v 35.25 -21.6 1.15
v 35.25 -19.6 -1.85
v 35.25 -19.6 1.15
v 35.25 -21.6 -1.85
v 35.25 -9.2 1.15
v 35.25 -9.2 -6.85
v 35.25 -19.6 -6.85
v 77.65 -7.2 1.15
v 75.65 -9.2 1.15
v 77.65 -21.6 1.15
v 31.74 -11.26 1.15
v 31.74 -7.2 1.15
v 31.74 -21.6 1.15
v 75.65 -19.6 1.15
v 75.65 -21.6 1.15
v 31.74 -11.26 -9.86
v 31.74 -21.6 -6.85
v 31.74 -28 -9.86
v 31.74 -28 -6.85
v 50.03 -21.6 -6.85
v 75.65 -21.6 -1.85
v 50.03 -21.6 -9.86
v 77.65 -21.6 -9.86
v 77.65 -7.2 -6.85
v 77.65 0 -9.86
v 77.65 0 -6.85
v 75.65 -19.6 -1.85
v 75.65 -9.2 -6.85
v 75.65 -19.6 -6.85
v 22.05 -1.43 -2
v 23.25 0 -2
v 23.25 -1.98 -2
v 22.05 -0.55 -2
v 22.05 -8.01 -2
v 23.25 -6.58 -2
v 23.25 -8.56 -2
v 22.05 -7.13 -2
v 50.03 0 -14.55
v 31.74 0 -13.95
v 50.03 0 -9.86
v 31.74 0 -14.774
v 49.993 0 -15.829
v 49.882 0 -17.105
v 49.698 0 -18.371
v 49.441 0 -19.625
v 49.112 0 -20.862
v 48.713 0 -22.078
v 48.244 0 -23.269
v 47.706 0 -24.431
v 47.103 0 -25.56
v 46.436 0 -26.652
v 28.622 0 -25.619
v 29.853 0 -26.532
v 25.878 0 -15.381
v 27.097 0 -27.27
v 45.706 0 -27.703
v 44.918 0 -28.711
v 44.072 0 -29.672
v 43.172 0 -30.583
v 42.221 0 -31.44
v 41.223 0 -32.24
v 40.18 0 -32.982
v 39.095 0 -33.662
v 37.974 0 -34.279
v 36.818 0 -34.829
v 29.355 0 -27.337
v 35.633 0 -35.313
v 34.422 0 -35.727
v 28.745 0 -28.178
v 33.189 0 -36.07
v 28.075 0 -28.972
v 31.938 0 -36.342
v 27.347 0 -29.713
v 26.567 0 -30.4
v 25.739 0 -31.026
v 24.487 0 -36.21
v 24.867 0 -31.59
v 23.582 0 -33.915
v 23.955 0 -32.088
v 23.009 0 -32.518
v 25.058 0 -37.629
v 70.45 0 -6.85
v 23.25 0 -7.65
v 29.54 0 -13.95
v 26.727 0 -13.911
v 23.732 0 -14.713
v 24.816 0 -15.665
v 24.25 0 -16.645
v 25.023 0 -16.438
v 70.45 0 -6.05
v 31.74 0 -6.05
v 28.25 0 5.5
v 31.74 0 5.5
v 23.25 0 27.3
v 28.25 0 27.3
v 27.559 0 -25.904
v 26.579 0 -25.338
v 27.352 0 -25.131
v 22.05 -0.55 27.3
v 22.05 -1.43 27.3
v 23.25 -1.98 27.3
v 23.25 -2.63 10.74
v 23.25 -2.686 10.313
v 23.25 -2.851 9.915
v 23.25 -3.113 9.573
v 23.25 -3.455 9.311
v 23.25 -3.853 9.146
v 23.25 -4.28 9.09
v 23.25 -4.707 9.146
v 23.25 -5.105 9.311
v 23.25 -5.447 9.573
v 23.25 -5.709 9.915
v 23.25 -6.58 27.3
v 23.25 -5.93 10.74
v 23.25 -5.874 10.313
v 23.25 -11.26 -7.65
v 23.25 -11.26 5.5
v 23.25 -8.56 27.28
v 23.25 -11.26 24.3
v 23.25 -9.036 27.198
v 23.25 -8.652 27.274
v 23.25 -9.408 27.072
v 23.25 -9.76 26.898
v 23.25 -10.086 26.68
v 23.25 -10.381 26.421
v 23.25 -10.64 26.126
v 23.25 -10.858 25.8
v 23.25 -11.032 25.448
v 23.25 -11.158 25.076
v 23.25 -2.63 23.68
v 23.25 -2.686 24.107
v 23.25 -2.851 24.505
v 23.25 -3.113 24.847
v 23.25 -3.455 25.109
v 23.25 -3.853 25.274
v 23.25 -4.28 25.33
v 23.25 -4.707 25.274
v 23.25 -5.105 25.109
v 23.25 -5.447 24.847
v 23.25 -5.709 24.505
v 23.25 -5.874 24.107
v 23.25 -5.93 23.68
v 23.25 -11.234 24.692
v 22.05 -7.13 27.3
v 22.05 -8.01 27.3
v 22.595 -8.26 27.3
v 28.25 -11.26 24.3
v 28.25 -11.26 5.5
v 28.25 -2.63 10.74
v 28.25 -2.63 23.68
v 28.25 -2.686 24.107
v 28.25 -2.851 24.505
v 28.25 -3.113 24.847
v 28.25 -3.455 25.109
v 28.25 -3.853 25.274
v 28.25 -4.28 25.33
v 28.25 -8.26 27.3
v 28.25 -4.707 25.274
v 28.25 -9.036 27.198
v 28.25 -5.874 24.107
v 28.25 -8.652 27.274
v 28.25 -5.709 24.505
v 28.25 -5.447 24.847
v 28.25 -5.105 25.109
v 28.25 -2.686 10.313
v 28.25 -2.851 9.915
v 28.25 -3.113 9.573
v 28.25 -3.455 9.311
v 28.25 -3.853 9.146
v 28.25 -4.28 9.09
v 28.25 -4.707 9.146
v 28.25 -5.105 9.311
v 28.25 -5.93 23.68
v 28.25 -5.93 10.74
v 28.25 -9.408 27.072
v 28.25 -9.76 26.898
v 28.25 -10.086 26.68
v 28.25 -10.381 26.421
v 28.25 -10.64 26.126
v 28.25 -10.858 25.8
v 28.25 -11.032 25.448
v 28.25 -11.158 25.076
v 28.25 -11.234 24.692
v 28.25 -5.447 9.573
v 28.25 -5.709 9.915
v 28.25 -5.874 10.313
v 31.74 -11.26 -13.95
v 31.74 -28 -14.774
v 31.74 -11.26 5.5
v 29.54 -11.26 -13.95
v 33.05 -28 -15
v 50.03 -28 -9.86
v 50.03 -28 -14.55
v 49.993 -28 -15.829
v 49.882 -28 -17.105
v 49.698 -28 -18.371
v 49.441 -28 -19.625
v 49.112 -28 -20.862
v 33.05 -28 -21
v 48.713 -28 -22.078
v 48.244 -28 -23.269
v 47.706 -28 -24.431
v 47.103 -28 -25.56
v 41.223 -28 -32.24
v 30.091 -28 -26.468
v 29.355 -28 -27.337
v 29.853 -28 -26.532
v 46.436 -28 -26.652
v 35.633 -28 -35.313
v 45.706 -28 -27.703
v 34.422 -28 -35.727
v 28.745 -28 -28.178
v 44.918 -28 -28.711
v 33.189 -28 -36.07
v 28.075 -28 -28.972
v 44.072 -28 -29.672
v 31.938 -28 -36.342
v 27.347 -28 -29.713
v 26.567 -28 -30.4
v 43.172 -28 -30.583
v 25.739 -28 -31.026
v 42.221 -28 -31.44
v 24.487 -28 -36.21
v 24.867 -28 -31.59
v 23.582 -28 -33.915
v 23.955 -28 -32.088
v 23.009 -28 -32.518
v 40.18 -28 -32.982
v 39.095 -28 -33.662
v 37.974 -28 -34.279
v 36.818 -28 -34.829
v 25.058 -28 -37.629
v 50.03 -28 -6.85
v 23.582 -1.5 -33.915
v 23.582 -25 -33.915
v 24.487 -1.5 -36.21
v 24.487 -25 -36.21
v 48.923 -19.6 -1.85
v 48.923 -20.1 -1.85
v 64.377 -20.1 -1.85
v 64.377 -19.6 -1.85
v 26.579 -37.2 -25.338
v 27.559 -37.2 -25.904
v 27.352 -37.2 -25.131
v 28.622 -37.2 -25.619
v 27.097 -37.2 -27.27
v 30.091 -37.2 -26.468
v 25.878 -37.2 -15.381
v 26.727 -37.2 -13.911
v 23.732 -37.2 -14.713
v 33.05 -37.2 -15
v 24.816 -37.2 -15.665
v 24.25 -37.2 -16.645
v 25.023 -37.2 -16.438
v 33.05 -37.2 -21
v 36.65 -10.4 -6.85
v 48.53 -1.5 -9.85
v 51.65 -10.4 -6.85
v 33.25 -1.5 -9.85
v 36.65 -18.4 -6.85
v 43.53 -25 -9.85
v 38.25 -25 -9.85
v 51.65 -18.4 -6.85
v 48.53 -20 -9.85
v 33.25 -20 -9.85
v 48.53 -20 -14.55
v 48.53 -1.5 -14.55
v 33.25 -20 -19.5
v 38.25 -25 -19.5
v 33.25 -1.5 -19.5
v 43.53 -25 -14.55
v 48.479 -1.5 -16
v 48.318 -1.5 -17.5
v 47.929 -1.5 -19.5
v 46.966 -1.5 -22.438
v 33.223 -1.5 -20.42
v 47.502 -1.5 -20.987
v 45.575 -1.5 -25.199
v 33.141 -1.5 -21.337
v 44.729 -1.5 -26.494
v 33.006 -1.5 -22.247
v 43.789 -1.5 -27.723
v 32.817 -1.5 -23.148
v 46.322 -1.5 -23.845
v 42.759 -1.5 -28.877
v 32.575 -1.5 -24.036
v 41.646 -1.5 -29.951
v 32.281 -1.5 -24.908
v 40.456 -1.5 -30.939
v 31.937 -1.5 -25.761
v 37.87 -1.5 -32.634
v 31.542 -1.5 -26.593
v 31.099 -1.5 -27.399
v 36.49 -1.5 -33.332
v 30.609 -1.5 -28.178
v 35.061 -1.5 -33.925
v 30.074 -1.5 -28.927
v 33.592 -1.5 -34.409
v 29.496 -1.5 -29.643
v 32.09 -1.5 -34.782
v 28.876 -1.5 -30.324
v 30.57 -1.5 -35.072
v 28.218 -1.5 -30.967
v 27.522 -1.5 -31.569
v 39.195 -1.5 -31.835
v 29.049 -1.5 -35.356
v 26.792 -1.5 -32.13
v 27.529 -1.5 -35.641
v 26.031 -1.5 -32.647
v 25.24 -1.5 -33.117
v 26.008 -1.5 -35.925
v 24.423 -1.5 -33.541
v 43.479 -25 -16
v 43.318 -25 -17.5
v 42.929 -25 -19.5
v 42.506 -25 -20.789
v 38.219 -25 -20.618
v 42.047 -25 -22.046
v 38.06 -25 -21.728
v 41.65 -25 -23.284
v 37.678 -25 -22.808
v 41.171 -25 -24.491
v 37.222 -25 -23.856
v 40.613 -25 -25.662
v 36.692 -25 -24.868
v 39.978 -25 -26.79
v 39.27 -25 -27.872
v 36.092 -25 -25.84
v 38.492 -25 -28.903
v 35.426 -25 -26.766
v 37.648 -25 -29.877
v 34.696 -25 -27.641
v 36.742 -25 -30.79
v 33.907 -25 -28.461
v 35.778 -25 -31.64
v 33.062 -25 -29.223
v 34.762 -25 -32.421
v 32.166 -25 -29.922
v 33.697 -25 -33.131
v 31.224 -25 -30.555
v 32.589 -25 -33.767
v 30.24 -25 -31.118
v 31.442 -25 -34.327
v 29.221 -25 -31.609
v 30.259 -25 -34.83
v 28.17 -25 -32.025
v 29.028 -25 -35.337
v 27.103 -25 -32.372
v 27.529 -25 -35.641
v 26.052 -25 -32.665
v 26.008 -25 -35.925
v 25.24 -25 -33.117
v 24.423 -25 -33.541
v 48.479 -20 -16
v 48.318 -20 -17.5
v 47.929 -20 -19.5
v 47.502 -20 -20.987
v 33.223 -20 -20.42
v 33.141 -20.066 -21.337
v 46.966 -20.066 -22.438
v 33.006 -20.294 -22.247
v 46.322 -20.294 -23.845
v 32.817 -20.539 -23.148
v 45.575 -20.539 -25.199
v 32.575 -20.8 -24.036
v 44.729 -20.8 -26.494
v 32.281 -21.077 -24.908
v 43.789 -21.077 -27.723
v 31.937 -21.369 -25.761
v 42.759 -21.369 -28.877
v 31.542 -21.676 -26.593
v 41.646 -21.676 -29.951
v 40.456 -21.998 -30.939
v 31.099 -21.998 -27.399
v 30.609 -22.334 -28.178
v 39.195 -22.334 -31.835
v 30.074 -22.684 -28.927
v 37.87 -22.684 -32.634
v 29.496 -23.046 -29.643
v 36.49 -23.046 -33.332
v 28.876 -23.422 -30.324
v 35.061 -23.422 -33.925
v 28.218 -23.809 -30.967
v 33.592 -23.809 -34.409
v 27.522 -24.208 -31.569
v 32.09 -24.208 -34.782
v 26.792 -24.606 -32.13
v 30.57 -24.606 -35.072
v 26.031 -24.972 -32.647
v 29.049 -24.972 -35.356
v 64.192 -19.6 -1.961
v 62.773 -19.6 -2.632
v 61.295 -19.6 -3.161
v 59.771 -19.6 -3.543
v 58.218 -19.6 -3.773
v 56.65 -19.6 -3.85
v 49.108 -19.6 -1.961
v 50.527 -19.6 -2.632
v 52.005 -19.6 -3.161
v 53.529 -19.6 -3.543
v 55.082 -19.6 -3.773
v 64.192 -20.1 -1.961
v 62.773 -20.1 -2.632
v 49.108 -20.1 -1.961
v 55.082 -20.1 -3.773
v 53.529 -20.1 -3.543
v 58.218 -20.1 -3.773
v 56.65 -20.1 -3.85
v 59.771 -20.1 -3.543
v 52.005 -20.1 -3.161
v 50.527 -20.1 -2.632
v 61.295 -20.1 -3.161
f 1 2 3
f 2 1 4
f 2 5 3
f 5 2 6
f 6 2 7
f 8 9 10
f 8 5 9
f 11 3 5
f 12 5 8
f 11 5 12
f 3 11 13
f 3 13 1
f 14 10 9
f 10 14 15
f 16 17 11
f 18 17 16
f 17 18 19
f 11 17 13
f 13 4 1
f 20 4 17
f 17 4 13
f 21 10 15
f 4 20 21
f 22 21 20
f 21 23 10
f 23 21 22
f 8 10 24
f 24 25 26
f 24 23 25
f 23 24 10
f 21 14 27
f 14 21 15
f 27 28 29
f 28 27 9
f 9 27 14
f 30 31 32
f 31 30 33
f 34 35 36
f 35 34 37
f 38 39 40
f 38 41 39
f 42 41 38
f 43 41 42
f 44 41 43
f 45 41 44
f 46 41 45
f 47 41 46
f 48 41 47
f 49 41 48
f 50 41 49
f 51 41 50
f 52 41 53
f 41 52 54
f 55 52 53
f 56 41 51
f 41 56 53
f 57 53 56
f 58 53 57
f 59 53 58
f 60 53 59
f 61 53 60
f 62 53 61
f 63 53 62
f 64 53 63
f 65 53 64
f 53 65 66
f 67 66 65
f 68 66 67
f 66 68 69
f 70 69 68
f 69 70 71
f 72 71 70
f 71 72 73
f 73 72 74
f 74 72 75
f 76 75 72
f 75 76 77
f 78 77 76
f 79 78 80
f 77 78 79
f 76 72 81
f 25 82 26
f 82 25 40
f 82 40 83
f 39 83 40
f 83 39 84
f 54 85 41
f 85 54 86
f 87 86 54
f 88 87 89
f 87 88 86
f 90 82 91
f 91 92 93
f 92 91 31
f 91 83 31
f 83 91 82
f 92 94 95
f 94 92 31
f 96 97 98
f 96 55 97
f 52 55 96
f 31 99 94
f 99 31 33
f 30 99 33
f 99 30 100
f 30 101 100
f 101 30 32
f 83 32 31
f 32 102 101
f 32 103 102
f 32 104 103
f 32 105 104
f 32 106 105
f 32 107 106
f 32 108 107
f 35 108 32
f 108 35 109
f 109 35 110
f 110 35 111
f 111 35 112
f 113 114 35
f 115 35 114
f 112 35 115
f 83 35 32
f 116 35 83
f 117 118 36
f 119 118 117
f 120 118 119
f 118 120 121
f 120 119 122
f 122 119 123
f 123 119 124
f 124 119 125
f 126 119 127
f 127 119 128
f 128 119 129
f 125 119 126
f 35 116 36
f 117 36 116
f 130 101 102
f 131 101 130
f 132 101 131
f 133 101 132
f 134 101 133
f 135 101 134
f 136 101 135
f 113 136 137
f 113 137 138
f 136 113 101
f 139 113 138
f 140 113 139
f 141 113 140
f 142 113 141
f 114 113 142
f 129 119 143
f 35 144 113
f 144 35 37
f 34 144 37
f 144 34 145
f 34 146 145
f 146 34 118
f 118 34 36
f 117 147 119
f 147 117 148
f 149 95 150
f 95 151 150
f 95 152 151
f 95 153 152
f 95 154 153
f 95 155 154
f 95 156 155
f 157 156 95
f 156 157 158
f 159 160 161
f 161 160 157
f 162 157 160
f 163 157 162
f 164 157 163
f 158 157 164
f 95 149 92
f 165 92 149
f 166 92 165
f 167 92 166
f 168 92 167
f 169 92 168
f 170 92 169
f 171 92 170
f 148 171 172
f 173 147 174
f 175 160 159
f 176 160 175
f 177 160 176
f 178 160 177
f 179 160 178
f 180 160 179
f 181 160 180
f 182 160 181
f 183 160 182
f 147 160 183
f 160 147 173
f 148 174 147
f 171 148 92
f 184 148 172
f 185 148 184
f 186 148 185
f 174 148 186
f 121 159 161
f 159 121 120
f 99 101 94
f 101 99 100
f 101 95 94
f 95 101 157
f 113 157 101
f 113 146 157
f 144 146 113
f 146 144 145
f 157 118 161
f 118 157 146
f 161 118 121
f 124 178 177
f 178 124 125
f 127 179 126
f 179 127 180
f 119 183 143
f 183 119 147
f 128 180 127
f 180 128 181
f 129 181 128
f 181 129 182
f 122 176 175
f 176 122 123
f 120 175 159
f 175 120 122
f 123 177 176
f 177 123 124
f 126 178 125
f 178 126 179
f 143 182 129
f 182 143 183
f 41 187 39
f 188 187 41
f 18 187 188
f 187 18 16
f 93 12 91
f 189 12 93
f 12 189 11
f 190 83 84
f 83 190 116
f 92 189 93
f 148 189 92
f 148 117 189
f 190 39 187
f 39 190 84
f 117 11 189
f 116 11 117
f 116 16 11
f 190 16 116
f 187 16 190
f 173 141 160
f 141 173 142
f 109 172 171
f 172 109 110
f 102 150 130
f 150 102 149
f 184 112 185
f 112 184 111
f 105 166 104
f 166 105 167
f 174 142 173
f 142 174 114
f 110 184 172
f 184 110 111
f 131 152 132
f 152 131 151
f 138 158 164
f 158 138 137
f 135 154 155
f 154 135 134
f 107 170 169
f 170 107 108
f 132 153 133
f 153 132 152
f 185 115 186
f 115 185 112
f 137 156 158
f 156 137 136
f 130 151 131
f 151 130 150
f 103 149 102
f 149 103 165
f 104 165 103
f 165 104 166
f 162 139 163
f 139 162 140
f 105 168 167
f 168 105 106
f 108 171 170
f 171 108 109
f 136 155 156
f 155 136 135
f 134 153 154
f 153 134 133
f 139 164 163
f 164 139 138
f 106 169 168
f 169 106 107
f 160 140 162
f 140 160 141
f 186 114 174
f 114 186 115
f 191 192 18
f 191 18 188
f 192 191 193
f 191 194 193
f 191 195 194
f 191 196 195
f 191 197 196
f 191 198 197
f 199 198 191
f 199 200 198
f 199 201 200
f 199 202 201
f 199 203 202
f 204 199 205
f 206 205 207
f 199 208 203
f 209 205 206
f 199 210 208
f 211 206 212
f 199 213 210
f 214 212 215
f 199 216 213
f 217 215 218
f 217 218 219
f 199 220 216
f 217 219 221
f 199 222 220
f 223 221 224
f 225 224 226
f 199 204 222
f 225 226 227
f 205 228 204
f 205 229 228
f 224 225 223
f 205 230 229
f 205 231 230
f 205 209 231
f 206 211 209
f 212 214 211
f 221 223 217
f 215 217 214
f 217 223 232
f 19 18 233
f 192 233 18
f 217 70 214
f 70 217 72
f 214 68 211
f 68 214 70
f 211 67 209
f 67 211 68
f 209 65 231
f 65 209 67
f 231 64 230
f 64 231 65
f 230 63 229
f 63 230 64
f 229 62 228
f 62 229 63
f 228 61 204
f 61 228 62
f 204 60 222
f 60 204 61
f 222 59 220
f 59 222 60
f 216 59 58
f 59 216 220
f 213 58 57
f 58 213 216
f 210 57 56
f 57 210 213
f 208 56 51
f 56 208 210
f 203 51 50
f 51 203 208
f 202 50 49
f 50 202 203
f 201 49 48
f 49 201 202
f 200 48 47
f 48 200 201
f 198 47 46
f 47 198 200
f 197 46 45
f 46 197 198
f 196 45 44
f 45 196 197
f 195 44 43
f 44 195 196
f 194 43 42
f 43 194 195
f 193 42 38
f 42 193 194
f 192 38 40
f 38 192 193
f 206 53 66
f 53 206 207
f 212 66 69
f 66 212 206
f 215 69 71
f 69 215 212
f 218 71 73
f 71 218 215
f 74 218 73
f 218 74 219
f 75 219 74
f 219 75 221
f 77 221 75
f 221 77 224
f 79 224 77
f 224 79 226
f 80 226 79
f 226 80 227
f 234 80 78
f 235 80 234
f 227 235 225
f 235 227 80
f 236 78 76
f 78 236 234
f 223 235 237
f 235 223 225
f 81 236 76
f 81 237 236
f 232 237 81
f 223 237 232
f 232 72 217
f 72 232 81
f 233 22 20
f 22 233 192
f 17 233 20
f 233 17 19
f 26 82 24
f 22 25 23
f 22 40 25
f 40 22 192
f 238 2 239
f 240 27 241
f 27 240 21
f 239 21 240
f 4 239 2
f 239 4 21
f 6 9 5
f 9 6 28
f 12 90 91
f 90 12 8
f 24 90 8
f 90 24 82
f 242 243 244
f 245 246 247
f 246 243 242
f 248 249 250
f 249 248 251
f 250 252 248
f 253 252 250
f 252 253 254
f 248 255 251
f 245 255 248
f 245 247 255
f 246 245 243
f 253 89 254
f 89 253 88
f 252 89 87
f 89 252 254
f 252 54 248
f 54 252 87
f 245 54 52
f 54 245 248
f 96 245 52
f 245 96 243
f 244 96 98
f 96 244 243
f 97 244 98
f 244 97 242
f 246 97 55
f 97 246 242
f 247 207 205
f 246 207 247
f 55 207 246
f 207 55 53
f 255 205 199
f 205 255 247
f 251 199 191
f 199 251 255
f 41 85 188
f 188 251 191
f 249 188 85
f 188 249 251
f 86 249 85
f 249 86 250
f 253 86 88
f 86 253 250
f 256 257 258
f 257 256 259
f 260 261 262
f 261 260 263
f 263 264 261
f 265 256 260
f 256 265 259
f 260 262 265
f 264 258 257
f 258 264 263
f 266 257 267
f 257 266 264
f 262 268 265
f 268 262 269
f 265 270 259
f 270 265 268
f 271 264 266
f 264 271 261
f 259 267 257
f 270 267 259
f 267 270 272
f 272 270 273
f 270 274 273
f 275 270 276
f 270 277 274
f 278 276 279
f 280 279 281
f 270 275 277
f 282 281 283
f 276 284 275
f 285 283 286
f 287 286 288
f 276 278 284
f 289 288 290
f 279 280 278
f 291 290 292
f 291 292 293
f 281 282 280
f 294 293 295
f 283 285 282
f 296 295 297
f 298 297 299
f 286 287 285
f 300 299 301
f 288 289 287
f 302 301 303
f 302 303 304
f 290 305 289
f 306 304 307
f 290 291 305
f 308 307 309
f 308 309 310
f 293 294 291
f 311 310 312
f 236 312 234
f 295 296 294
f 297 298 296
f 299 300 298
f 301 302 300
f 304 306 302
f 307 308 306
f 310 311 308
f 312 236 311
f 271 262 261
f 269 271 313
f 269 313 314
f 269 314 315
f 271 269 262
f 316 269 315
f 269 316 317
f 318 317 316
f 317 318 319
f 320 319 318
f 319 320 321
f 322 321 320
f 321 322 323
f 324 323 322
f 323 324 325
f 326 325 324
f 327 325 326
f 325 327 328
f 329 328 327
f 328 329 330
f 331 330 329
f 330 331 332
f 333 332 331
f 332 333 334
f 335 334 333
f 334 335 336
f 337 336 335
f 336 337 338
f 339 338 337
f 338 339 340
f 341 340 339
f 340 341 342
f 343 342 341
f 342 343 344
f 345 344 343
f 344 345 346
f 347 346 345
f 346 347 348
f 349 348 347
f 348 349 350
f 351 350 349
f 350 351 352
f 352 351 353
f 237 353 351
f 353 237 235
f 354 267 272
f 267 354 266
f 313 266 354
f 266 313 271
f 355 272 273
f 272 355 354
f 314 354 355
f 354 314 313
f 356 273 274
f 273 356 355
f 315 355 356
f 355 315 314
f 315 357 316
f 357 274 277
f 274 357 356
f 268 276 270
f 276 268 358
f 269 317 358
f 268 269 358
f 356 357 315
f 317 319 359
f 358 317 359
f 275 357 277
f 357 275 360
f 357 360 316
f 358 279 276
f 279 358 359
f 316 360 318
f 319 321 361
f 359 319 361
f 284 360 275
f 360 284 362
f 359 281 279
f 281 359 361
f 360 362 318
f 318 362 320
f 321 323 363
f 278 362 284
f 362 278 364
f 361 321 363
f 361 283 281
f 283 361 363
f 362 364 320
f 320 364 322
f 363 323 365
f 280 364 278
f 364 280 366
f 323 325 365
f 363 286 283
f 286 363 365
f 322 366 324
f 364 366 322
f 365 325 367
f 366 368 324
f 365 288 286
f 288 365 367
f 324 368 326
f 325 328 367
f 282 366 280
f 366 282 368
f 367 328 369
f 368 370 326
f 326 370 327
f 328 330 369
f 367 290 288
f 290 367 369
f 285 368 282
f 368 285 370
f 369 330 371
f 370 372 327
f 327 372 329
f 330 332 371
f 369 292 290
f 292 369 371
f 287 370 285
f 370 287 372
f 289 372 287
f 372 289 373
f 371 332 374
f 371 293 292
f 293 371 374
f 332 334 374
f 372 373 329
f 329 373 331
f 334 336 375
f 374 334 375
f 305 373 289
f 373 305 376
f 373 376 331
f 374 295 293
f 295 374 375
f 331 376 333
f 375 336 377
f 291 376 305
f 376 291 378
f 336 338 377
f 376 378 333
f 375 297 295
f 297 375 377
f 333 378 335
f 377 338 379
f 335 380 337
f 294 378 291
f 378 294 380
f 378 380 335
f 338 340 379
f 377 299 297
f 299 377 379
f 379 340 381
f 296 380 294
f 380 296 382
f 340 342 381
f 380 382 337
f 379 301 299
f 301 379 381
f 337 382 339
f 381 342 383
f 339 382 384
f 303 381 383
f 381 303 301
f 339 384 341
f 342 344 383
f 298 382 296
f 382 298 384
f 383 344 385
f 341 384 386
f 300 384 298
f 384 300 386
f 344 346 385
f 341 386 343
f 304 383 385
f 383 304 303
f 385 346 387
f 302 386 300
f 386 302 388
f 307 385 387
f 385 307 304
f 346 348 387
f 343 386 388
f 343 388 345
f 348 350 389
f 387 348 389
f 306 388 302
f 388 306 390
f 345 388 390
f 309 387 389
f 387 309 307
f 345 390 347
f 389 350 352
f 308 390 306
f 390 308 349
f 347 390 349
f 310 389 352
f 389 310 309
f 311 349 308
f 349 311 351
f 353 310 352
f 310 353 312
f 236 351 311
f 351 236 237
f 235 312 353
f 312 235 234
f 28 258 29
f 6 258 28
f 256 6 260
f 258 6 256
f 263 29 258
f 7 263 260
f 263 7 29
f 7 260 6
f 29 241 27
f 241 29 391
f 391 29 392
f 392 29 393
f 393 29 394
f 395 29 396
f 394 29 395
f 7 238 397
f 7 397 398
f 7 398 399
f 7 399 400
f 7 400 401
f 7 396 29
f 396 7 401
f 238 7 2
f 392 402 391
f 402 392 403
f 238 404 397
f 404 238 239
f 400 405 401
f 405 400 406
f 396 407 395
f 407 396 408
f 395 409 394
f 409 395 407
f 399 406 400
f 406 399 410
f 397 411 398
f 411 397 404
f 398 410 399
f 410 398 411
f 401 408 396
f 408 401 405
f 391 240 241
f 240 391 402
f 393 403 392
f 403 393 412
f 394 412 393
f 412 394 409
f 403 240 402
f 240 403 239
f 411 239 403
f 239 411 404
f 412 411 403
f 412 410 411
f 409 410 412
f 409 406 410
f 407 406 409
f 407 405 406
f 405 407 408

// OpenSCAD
// file: lib/duct_body.scad
// Body of the one-piece 4010 ducts — Igneus V2 (Anet ET4/ET5)
// Remix of "IGNEUS V2 - E3D V6/VOLCANO" by Locos3D, CC BY-NC-SA 4.0
// https://www.thingiverse.com/thing:4178590
//
// Same frame as duct4010.scad: right-hand part as mounted, Z+ up, X- towards the nozzle, Y- = front.
// Drawn from scratch as a single part: the curves of the air channel, the rails of the mounting arm and its
// height slot are measured from Locos3D's 5015 duct, so it mounts and aims the air like the original.
// It prints lying on its flat back face (y = 0) without supports: every wall is a prism standing on that
// face or rises at 45 degrees, and what is left as a ceiling is a short bridge.

/* [Internal: one-piece duct body] */
// air channel in the XZ plane: inner wall (nozzle side) and outer wall, both arcs ending in the outlet
ch_near_c  = [-18.38, -19.50];   // centre of the inner wall curve
ch_near_r  = [14.07, 15.58];     // its outer face (towards the nozzle) and channel face
ch_near_a  = 67.7;               // the inner wall ends this many degrees below the horizontal
ch_far_c   = [-8.19, -14.55];    // centre of the outer wall curve
ch_far_r   = [20.67, 22.17];     // its channel face and outer face
ch_far_a   = 79.4;               // the curve ends here and a straight lip aims the air at the nozzle
ch_lip     = [7.3, 7.0];         // lip length: channel face, outer face
ch_back    = -1.5;               // channel back face: 1.5 mm wall on the face it prints on
ch_front   = -25.0;              // channel front face: 3 mm front wall
duct_d     = 28.0;               // depth of the duct (Y)
duct_top   = -9.85;              // top of the curved duct = where the air comes in
roof_c     = 5.0;                // 45° chamfers along the front edges of the channel...
roof_ridge = 4.0;                // ...leaving a flat strip this wide (a short bridge when printing)

// mounting arm: rails that slide into the body's grooves and the slot of the height-adjustment screw
arm_x      = [-12.8, -7.8];      // arm face against the body / outer face (the screw head bears on it)
arm_d      = 11.26;              // arm depth (Y)
arm_top    = 27.3;               // top of the arm
rail_tip   = -14.0;              // the rails stick out of the arm face up to here
rails      = [[0, 1.98], [6.58, 8.56]];   // rail bases (depth from the back face); tips 0.55 mm narrower each side
slot_y     = -4.28;              // height slot: centre (Y), width and the Z range of the screw
slot_w     = 3.3;
slot_z     = [9.09, 25.33];
spine_top  = 5.5;                // the block that joins arm and duct stays under the screw head

// derived: straight faces of the walls
near_out_x = ch_near_c[0] + ch_near_r[0];   // -4.31
near_in_x  = ch_near_c[0] + ch_near_r[1];   // -2.80
far_in_x   = ch_far_c[0] + ch_far_r[0];     // 12.48
far_out_x  = ch_far_c[0] + ch_far_r[1];     // 13.98

function pol(c, r, a) = [c[0] + r * cos(a), c[1] + r * sin(a)];
function lerp(a, b, t) = a + (b - a) * t;
function cw_dir(a) = [sin(a), -cos(a)];     // tangent of a circle at angle a, going clockwise
function seg_n(n) = [for (i = [0 : n]) i / n];

// outer wall, channel face: straight, then the arc, then the lip; f = 0..1 from the height of the inner
// wall's centre (where the inner wall starts to curve) to the tip of the lip
far_a0    = asin((ch_near_c[1] - ch_far_c[1]) / ch_far_r[0]);
far_arc_l = ch_far_r[0] * (ch_far_a + far_a0) * PI / 180;
function far_pt(f) = let(s = f * (far_arc_l + ch_lip[0]))
    s <= far_arc_l ? pol(ch_far_c, ch_far_r[0], far_a0 - s / ch_far_r[0] * 180 / PI)
                   : pol(ch_far_c, ch_far_r[0], -ch_far_a) + (s - far_arc_l) * cw_dir(-ch_far_a);
function near_pt(f) = pol(ch_near_c, ch_near_r[1], -f * ch_near_a);
function far_x_at(z) = z >= ch_far_c[1] ? far_in_x : ch_far_c[0] + sqrt(pow(ch_far_r[0], 2) - pow(z - ch_far_c[1], 2));

// Cross-section of the air path: the line from a (inner side) to b (outer side) in XZ, swept in Y from the
// back face yb to the front face yf, with the two front edges chamfered at 45 degrees by c.
function sec(a, b, yb = ch_back, yf = ch_front, c = roof_c) = [a, b, yb, yf, c];
function sec_pts(s) = let(a = s[0], b = s[1], yb = s[2], yf = s[3], l = norm(b - a), u = (b - a) / l,
                          c = min(s[4], max(0, (l - roof_ridge) / 2)))
    [[a[0], yb, a[1]], [b[0], yb, b[1]], [b[0], yf + c, b[1]],
     [b[0] - c * u[0], yf, b[1] - c * u[1]], [a[0] + c * u[0], yf, a[1] + c * u[1]], [a[0], yf + c, a[1]]];

// solid between consecutive cross-sections (each piece is convex, neighbours share a face)
module loft(secs) for (i = [0 : len(secs) - 2])
    hull() polyhedron(points = concat(sec_pts(secs[i]), sec_pts(secs[i + 1])),
                      faces = [[0, 1, 2, 3, 4, 5], [6, 7, 8, 9, 10, 11]]);

// The curved duct, from its top (duct_top) to 1.5 mm past the outlet
function duct_secs(n = 20) = concat(
    [for (z = [duct_top, -12, ch_far_c[1], -16, -17.5, ch_near_c[1]]) sec([near_in_x, z], [far_x_at(z), z])],
    [for (f = seg_n(n)) if (f > 0) sec(near_pt(f), far_pt(f))],
    [sec(near_pt(1) + 1.5 * cw_dir(-ch_near_a), far_pt(1) + 1.5 * cw_dir(-ch_far_a))]);

module duct_channel() loft(duct_secs());

// XZ outline of the duct walls, from z_top down to the outlet
module duct_outline(z_top = duct_top) {
    a_near = -ch_near_a;
    lip_out_end = pol(ch_far_c, ch_far_r[1], -ch_far_a) + ch_lip[1] * cw_dir(-ch_far_a);
    polygon(concat(
        [[near_out_x, z_top]],
        [for (f = seg_n(16)) pol(ch_near_c, ch_near_r[0], -f * ch_near_a)],   // inner wall, nozzle side
        [pol(ch_near_c, ch_near_r[1], a_near)],                              // its end, across the wall
        [far_pt(1)],                                                         // across the outlet
        [lip_out_end],                                                       // end of the lip
        [for (f = seg_n(24)) pol(ch_far_c, ch_far_r[1], -ch_far_a * (1 - f))],   // outer wall, back up
        [[far_out_x, z_top]]));
}

// the duct walls as a prism standing on the back face
module duct_shell(z_top = duct_top) rotate([90, 0, 0]) linear_extrude(height = duct_d) duct_outline(z_top);

// Arm profile in XY (rails on the face against the body)
module arm_profile() {
    teeth = [for (r = rails) each [[arm_x[0], -r[0]], [rail_tip, -r[0] - 0.55], [rail_tip, -r[1] + 0.55], [arm_x[0], -r[1]]]];
    polygon(concat([[arm_x[1], 0], [arm_x[1], -arm_d], [arm_x[0], -arm_d]], [for (i = [len(teeth) - 1 : -1 : 0]) teeth[i]]));
}

// Mounting arm: the rails slide into the grooves on the side of the Igneus body and the M3 screw goes through
// the height slot into the body. The spine joins it to the duct, below the screw head.
module mount_arm() {
    difference() {
        union() {
            intersection() {
                translate([0, 0, -2]) linear_extrude(height = arm_top + 2) arm_profile();
                // round the top front corner (the back corner stays square: it sits on the bed)
                rotate([90, 0, 90]) translate([0, 0, -20]) linear_extrude(height = 20)
                    offset(r = 3) offset(delta = -3) translate([-arm_d, -10]) square([arm_d + 3, arm_top + 10]);
            }
            // spine: from the arm to the inner wall of the duct, chamfered under the arm
            rotate([90, 0, 0]) linear_extrude(height = arm_d)
                polygon([[arm_x[0], spine_top], [near_out_x, spine_top], [near_out_x, duct_top - 4.1],
                         [near_out_x - 2.2, duct_top - 4.1], [arm_x[0], duct_top + 2.2]]);
        }
        slot();
    }
}

module slot()
    hull() for (z = [slot_z[0] + slot_w / 2, slot_z[1] - slot_w / 2])
        translate([arm_x[0] - 2.5, slot_y, z]) rotate([0, 90, 0]) cylinder(d = slot_w, h = arm_x[1] - arm_x[0] + 5, $fn = 24);
// file: lib/flat4010.scad
// Flat variant of the 4010 adapter — Igneus V2 (Anet ET4/ET5)
// Remix of "IGNEUS V2 - E3D V6/VOLCANO" by Locos3D, CC BY-NC-SA 4.0
// https://www.thingiverse.com/thing:4178590
//
// The 4010 blower sits on top of the adapter with its intake facing the front (like the 2510 hotend fan),
// as low as possible: the fan pocket sits right on top of the nozzle that goes into the original 5015 duct.
// Same coordinate system as duct4010.scad (right-hand part, as mounted; Y- = front).
include <duct4010.scad>

/* [Flat variant] */
flat_floor    = 3.0;            // floor between the nozzle and the fan (mm)
flat_cradle_h = 8.0;            // cradle depth (mm): in this variant the fan is held by the cradle alone
flat_front_h  = 5.0;            // one-piece duct: front wall of the cradle, below the blower's intake (mm)
flat_outlet   = [1.2, 16.2];    // fan outlet along its bottom edge, measured from the inner end (mm)
flat_fan_x0   = -0.6;           // inner side of the fan (just clear of the duct arm, whose face is at x = -2.8)
flat_fan_y0   = -19.4;          // front face of the fan (intake), centred over the nozzle
flat_z_seat   = nozzle_top + flat_floor;   // where the bottom edge of the fan rests

flat_cradle_x = [-2.8, flat_fan_x0 + fan_w + clearance + cradle_wall];
flat_cradle_y = [flat_fan_y0 - clearance - cradle_wall, flat_fan_y0 + fan_t + clearance + cradle_wall];
function flat_out_x() = [flat_fan_x0 + flat_outlet[0], flat_fan_x0 + flat_outlet[1]];
function flat_out_y() = [flat_fan_y0 + 1.0, flat_fan_y0 + fan_t - 1.0];

// Floor over the top of the nozzle (stopping at y = -5.1, in front of the two ribs on the inside of the duct's
// back plate), and the cradle block on it, 0.15 mm above the top edges of the duct walls. Where the floor is
// wider than the cradle it narrows at 45° (or steeper) up to it, and a wedge in the socket's notch covers the
// top of the key tab: printed upside down, nothing sticks out into the air.
module flat_body() {
    w = x_ext[1] - x_ext[0];
    hull() {
        translate([x_ext[0], -24.9, nozzle_top]) cube([w, 19.8, eps]);
        translate([x_ext[0], flat_cradle_y[0], nozzle_top + 3.3]) cube([w, flat_cradle_y[1] - flat_cradle_y[0], eps]);
    }
    kx = [socket_key[0][0] + 0.15, socket_key[0][1] - 0.15];
    ky = socket_key[1] - 0.19;                   // back face of the key tab
    translate([kx[0], 0, 0]) rotate([90, 0, 90]) linear_extrude(height = kx[1] - kx[0])
        polygon([[-7.3, nozzle_top], [ky, nozzle_top], [ky, nozzle_top + 0.2], [-7.3, nozzle_top + 0.2 + ky + 7.3]]);
    translate([flat_cradle_x[0], flat_cradle_y[0], nozzle_top + 0.15])
        cube([flat_cradle_x[1] - flat_cradle_x[0], flat_cradle_y[1] - flat_cradle_y[0], flat_floor - 0.15 + flat_cradle_h]);
}

// Air path: through the nozzle, then a short taper into the fan outlet
module flat_air() {
    in_w = nozzle_in[1] - nozzle_in[0];
    translate([nozzle_in[0][0], nozzle_in[0][1], -16]) cube([in_w[0], in_w[1], 16 + nozzle_top + eps]);
    hull() {
        translate([nozzle_in[0][0], nozzle_in[0][1], nozzle_top]) cube([in_w[0], in_w[1], eps]);
        translate([flat_out_x()[0], flat_out_y()[0], flat_z_seat])
            cube([flat_out_x()[1] - flat_out_x()[0], flat_out_y()[1] - flat_out_y()[0], eps]);
    }
}

module flat_pocket() {
    translate([flat_fan_x0 - clearance, flat_fan_y0 - clearance, flat_z_seat])
        cube([fan_w + 2 * clearance, fan_t + 2 * clearance, flat_cradle_h + 40]);
    // relief for the ring round the intake (see fan_pocket); impeller axis 21.2 mm from the inner end, 19 mm up
    translate([flat_fan_x0 + 21.2, flat_fan_y0 - clearance + eps, flat_z_seat + 19])
        rotate([90, 0, 0]) cylinder(d = intake_rim, h = 0.5 + eps, $fn = 64);
}

// Flat 4010 adapter for the original 5015 duct (separate part). Prints upside down without supports.
module adapter4010_flat()
    difference() {
        union() { nozzle(); flat_body(); }
        flat_air();
        flat_pocket();
    }

// One-piece duct, flat version: duct, floor, cradle and mounting arm drawn as one part, with the LED channel.
// Prints lying on its flat back face without supports; the low front wall of the cradle is a bridge between
// the two end walls.
module duct4010_flat() {
    cx = [near_out_x, flat_cradle_x[1]];   cy = flat_cradle_y;   // the inner end wall reaches the duct's wall
    zt = flat_z_seat + flat_cradle_h;
    px0 = flat_fan_x0 - clearance;
    back = cy[1] - cradle_wall;          // back wall of the cradle, behind the fan
    ox = flat_out_x();   oy = flat_out_y();
    plenum = [sec([ox[0], flat_z_seat + 0.5], [ox[1], flat_z_seat + 0.5], oy[1], oy[0], 0),
              sec([ox[0], flat_z_seat], [ox[1], flat_z_seat], oy[1], oy[0], 0)];
    difference() {
        union() {
            duct_shell(duct_top);
            // floor: over the duct and under the whole cradle
            translate([near_out_x, -duct_d, duct_top - eps]) cube([far_out_x - near_out_x, duct_d, flat_floor + eps]);
            translate([cx[0], cy[0], duct_top - eps]) cube([cx[1] - cx[0], -cy[0], flat_floor + eps]);
            // cradle walls: low front wall, full-height end walls and back wall
            translate([cx[0], cy[0], flat_z_seat - eps]) cube([cx[1] - cx[0], cy[1] - cy[0], min(flat_front_h, flat_cradle_h) + eps]);
            for (w = [[cx[0], px0], [cx[1] - cradle_wall, cx[1]]])
                translate([w[0], cy[0], flat_z_seat - eps]) cube([w[1] - w[0], cy[1] - cy[0], zt - flat_z_seat + eps]);
            translate([cx[0], back, flat_z_seat - eps]) cube([cx[1] - cx[0], cy[1] - back, zt - flat_z_seat + eps]);
            // behind the cradle, down to the back face at 45°
            hull() {
                translate([cx[0], cy[1] - eps, duct_top]) cube([cx[1] - cx[0], eps, zt - duct_top]);
                translate([cx[0], -eps, duct_top]) cube([cx[1] - cx[0] + cy[1], eps, zt - duct_top + cy[1]]);
            }
            mount_arm();
            if (led) led_channel();
        }
        loft(concat(plenum, duct_secs()));
        flat_pocket();
        slot();
    }
}

echo(str("Flat cradle: ", fan_w + 2 * clearance, " x ", fan_t + 2 * clearance, " mm, fan edge at z = ", flat_z_seat));
// main file
// color: #1d1d1f
// variant: onepiece_flat
// One-piece 4010 duct, flat version (blower on top, intake to the front), right side (as mounted).
include <lib/flat4010.scad>

translate([36.05, 0, 0]) duct4010_flat();
